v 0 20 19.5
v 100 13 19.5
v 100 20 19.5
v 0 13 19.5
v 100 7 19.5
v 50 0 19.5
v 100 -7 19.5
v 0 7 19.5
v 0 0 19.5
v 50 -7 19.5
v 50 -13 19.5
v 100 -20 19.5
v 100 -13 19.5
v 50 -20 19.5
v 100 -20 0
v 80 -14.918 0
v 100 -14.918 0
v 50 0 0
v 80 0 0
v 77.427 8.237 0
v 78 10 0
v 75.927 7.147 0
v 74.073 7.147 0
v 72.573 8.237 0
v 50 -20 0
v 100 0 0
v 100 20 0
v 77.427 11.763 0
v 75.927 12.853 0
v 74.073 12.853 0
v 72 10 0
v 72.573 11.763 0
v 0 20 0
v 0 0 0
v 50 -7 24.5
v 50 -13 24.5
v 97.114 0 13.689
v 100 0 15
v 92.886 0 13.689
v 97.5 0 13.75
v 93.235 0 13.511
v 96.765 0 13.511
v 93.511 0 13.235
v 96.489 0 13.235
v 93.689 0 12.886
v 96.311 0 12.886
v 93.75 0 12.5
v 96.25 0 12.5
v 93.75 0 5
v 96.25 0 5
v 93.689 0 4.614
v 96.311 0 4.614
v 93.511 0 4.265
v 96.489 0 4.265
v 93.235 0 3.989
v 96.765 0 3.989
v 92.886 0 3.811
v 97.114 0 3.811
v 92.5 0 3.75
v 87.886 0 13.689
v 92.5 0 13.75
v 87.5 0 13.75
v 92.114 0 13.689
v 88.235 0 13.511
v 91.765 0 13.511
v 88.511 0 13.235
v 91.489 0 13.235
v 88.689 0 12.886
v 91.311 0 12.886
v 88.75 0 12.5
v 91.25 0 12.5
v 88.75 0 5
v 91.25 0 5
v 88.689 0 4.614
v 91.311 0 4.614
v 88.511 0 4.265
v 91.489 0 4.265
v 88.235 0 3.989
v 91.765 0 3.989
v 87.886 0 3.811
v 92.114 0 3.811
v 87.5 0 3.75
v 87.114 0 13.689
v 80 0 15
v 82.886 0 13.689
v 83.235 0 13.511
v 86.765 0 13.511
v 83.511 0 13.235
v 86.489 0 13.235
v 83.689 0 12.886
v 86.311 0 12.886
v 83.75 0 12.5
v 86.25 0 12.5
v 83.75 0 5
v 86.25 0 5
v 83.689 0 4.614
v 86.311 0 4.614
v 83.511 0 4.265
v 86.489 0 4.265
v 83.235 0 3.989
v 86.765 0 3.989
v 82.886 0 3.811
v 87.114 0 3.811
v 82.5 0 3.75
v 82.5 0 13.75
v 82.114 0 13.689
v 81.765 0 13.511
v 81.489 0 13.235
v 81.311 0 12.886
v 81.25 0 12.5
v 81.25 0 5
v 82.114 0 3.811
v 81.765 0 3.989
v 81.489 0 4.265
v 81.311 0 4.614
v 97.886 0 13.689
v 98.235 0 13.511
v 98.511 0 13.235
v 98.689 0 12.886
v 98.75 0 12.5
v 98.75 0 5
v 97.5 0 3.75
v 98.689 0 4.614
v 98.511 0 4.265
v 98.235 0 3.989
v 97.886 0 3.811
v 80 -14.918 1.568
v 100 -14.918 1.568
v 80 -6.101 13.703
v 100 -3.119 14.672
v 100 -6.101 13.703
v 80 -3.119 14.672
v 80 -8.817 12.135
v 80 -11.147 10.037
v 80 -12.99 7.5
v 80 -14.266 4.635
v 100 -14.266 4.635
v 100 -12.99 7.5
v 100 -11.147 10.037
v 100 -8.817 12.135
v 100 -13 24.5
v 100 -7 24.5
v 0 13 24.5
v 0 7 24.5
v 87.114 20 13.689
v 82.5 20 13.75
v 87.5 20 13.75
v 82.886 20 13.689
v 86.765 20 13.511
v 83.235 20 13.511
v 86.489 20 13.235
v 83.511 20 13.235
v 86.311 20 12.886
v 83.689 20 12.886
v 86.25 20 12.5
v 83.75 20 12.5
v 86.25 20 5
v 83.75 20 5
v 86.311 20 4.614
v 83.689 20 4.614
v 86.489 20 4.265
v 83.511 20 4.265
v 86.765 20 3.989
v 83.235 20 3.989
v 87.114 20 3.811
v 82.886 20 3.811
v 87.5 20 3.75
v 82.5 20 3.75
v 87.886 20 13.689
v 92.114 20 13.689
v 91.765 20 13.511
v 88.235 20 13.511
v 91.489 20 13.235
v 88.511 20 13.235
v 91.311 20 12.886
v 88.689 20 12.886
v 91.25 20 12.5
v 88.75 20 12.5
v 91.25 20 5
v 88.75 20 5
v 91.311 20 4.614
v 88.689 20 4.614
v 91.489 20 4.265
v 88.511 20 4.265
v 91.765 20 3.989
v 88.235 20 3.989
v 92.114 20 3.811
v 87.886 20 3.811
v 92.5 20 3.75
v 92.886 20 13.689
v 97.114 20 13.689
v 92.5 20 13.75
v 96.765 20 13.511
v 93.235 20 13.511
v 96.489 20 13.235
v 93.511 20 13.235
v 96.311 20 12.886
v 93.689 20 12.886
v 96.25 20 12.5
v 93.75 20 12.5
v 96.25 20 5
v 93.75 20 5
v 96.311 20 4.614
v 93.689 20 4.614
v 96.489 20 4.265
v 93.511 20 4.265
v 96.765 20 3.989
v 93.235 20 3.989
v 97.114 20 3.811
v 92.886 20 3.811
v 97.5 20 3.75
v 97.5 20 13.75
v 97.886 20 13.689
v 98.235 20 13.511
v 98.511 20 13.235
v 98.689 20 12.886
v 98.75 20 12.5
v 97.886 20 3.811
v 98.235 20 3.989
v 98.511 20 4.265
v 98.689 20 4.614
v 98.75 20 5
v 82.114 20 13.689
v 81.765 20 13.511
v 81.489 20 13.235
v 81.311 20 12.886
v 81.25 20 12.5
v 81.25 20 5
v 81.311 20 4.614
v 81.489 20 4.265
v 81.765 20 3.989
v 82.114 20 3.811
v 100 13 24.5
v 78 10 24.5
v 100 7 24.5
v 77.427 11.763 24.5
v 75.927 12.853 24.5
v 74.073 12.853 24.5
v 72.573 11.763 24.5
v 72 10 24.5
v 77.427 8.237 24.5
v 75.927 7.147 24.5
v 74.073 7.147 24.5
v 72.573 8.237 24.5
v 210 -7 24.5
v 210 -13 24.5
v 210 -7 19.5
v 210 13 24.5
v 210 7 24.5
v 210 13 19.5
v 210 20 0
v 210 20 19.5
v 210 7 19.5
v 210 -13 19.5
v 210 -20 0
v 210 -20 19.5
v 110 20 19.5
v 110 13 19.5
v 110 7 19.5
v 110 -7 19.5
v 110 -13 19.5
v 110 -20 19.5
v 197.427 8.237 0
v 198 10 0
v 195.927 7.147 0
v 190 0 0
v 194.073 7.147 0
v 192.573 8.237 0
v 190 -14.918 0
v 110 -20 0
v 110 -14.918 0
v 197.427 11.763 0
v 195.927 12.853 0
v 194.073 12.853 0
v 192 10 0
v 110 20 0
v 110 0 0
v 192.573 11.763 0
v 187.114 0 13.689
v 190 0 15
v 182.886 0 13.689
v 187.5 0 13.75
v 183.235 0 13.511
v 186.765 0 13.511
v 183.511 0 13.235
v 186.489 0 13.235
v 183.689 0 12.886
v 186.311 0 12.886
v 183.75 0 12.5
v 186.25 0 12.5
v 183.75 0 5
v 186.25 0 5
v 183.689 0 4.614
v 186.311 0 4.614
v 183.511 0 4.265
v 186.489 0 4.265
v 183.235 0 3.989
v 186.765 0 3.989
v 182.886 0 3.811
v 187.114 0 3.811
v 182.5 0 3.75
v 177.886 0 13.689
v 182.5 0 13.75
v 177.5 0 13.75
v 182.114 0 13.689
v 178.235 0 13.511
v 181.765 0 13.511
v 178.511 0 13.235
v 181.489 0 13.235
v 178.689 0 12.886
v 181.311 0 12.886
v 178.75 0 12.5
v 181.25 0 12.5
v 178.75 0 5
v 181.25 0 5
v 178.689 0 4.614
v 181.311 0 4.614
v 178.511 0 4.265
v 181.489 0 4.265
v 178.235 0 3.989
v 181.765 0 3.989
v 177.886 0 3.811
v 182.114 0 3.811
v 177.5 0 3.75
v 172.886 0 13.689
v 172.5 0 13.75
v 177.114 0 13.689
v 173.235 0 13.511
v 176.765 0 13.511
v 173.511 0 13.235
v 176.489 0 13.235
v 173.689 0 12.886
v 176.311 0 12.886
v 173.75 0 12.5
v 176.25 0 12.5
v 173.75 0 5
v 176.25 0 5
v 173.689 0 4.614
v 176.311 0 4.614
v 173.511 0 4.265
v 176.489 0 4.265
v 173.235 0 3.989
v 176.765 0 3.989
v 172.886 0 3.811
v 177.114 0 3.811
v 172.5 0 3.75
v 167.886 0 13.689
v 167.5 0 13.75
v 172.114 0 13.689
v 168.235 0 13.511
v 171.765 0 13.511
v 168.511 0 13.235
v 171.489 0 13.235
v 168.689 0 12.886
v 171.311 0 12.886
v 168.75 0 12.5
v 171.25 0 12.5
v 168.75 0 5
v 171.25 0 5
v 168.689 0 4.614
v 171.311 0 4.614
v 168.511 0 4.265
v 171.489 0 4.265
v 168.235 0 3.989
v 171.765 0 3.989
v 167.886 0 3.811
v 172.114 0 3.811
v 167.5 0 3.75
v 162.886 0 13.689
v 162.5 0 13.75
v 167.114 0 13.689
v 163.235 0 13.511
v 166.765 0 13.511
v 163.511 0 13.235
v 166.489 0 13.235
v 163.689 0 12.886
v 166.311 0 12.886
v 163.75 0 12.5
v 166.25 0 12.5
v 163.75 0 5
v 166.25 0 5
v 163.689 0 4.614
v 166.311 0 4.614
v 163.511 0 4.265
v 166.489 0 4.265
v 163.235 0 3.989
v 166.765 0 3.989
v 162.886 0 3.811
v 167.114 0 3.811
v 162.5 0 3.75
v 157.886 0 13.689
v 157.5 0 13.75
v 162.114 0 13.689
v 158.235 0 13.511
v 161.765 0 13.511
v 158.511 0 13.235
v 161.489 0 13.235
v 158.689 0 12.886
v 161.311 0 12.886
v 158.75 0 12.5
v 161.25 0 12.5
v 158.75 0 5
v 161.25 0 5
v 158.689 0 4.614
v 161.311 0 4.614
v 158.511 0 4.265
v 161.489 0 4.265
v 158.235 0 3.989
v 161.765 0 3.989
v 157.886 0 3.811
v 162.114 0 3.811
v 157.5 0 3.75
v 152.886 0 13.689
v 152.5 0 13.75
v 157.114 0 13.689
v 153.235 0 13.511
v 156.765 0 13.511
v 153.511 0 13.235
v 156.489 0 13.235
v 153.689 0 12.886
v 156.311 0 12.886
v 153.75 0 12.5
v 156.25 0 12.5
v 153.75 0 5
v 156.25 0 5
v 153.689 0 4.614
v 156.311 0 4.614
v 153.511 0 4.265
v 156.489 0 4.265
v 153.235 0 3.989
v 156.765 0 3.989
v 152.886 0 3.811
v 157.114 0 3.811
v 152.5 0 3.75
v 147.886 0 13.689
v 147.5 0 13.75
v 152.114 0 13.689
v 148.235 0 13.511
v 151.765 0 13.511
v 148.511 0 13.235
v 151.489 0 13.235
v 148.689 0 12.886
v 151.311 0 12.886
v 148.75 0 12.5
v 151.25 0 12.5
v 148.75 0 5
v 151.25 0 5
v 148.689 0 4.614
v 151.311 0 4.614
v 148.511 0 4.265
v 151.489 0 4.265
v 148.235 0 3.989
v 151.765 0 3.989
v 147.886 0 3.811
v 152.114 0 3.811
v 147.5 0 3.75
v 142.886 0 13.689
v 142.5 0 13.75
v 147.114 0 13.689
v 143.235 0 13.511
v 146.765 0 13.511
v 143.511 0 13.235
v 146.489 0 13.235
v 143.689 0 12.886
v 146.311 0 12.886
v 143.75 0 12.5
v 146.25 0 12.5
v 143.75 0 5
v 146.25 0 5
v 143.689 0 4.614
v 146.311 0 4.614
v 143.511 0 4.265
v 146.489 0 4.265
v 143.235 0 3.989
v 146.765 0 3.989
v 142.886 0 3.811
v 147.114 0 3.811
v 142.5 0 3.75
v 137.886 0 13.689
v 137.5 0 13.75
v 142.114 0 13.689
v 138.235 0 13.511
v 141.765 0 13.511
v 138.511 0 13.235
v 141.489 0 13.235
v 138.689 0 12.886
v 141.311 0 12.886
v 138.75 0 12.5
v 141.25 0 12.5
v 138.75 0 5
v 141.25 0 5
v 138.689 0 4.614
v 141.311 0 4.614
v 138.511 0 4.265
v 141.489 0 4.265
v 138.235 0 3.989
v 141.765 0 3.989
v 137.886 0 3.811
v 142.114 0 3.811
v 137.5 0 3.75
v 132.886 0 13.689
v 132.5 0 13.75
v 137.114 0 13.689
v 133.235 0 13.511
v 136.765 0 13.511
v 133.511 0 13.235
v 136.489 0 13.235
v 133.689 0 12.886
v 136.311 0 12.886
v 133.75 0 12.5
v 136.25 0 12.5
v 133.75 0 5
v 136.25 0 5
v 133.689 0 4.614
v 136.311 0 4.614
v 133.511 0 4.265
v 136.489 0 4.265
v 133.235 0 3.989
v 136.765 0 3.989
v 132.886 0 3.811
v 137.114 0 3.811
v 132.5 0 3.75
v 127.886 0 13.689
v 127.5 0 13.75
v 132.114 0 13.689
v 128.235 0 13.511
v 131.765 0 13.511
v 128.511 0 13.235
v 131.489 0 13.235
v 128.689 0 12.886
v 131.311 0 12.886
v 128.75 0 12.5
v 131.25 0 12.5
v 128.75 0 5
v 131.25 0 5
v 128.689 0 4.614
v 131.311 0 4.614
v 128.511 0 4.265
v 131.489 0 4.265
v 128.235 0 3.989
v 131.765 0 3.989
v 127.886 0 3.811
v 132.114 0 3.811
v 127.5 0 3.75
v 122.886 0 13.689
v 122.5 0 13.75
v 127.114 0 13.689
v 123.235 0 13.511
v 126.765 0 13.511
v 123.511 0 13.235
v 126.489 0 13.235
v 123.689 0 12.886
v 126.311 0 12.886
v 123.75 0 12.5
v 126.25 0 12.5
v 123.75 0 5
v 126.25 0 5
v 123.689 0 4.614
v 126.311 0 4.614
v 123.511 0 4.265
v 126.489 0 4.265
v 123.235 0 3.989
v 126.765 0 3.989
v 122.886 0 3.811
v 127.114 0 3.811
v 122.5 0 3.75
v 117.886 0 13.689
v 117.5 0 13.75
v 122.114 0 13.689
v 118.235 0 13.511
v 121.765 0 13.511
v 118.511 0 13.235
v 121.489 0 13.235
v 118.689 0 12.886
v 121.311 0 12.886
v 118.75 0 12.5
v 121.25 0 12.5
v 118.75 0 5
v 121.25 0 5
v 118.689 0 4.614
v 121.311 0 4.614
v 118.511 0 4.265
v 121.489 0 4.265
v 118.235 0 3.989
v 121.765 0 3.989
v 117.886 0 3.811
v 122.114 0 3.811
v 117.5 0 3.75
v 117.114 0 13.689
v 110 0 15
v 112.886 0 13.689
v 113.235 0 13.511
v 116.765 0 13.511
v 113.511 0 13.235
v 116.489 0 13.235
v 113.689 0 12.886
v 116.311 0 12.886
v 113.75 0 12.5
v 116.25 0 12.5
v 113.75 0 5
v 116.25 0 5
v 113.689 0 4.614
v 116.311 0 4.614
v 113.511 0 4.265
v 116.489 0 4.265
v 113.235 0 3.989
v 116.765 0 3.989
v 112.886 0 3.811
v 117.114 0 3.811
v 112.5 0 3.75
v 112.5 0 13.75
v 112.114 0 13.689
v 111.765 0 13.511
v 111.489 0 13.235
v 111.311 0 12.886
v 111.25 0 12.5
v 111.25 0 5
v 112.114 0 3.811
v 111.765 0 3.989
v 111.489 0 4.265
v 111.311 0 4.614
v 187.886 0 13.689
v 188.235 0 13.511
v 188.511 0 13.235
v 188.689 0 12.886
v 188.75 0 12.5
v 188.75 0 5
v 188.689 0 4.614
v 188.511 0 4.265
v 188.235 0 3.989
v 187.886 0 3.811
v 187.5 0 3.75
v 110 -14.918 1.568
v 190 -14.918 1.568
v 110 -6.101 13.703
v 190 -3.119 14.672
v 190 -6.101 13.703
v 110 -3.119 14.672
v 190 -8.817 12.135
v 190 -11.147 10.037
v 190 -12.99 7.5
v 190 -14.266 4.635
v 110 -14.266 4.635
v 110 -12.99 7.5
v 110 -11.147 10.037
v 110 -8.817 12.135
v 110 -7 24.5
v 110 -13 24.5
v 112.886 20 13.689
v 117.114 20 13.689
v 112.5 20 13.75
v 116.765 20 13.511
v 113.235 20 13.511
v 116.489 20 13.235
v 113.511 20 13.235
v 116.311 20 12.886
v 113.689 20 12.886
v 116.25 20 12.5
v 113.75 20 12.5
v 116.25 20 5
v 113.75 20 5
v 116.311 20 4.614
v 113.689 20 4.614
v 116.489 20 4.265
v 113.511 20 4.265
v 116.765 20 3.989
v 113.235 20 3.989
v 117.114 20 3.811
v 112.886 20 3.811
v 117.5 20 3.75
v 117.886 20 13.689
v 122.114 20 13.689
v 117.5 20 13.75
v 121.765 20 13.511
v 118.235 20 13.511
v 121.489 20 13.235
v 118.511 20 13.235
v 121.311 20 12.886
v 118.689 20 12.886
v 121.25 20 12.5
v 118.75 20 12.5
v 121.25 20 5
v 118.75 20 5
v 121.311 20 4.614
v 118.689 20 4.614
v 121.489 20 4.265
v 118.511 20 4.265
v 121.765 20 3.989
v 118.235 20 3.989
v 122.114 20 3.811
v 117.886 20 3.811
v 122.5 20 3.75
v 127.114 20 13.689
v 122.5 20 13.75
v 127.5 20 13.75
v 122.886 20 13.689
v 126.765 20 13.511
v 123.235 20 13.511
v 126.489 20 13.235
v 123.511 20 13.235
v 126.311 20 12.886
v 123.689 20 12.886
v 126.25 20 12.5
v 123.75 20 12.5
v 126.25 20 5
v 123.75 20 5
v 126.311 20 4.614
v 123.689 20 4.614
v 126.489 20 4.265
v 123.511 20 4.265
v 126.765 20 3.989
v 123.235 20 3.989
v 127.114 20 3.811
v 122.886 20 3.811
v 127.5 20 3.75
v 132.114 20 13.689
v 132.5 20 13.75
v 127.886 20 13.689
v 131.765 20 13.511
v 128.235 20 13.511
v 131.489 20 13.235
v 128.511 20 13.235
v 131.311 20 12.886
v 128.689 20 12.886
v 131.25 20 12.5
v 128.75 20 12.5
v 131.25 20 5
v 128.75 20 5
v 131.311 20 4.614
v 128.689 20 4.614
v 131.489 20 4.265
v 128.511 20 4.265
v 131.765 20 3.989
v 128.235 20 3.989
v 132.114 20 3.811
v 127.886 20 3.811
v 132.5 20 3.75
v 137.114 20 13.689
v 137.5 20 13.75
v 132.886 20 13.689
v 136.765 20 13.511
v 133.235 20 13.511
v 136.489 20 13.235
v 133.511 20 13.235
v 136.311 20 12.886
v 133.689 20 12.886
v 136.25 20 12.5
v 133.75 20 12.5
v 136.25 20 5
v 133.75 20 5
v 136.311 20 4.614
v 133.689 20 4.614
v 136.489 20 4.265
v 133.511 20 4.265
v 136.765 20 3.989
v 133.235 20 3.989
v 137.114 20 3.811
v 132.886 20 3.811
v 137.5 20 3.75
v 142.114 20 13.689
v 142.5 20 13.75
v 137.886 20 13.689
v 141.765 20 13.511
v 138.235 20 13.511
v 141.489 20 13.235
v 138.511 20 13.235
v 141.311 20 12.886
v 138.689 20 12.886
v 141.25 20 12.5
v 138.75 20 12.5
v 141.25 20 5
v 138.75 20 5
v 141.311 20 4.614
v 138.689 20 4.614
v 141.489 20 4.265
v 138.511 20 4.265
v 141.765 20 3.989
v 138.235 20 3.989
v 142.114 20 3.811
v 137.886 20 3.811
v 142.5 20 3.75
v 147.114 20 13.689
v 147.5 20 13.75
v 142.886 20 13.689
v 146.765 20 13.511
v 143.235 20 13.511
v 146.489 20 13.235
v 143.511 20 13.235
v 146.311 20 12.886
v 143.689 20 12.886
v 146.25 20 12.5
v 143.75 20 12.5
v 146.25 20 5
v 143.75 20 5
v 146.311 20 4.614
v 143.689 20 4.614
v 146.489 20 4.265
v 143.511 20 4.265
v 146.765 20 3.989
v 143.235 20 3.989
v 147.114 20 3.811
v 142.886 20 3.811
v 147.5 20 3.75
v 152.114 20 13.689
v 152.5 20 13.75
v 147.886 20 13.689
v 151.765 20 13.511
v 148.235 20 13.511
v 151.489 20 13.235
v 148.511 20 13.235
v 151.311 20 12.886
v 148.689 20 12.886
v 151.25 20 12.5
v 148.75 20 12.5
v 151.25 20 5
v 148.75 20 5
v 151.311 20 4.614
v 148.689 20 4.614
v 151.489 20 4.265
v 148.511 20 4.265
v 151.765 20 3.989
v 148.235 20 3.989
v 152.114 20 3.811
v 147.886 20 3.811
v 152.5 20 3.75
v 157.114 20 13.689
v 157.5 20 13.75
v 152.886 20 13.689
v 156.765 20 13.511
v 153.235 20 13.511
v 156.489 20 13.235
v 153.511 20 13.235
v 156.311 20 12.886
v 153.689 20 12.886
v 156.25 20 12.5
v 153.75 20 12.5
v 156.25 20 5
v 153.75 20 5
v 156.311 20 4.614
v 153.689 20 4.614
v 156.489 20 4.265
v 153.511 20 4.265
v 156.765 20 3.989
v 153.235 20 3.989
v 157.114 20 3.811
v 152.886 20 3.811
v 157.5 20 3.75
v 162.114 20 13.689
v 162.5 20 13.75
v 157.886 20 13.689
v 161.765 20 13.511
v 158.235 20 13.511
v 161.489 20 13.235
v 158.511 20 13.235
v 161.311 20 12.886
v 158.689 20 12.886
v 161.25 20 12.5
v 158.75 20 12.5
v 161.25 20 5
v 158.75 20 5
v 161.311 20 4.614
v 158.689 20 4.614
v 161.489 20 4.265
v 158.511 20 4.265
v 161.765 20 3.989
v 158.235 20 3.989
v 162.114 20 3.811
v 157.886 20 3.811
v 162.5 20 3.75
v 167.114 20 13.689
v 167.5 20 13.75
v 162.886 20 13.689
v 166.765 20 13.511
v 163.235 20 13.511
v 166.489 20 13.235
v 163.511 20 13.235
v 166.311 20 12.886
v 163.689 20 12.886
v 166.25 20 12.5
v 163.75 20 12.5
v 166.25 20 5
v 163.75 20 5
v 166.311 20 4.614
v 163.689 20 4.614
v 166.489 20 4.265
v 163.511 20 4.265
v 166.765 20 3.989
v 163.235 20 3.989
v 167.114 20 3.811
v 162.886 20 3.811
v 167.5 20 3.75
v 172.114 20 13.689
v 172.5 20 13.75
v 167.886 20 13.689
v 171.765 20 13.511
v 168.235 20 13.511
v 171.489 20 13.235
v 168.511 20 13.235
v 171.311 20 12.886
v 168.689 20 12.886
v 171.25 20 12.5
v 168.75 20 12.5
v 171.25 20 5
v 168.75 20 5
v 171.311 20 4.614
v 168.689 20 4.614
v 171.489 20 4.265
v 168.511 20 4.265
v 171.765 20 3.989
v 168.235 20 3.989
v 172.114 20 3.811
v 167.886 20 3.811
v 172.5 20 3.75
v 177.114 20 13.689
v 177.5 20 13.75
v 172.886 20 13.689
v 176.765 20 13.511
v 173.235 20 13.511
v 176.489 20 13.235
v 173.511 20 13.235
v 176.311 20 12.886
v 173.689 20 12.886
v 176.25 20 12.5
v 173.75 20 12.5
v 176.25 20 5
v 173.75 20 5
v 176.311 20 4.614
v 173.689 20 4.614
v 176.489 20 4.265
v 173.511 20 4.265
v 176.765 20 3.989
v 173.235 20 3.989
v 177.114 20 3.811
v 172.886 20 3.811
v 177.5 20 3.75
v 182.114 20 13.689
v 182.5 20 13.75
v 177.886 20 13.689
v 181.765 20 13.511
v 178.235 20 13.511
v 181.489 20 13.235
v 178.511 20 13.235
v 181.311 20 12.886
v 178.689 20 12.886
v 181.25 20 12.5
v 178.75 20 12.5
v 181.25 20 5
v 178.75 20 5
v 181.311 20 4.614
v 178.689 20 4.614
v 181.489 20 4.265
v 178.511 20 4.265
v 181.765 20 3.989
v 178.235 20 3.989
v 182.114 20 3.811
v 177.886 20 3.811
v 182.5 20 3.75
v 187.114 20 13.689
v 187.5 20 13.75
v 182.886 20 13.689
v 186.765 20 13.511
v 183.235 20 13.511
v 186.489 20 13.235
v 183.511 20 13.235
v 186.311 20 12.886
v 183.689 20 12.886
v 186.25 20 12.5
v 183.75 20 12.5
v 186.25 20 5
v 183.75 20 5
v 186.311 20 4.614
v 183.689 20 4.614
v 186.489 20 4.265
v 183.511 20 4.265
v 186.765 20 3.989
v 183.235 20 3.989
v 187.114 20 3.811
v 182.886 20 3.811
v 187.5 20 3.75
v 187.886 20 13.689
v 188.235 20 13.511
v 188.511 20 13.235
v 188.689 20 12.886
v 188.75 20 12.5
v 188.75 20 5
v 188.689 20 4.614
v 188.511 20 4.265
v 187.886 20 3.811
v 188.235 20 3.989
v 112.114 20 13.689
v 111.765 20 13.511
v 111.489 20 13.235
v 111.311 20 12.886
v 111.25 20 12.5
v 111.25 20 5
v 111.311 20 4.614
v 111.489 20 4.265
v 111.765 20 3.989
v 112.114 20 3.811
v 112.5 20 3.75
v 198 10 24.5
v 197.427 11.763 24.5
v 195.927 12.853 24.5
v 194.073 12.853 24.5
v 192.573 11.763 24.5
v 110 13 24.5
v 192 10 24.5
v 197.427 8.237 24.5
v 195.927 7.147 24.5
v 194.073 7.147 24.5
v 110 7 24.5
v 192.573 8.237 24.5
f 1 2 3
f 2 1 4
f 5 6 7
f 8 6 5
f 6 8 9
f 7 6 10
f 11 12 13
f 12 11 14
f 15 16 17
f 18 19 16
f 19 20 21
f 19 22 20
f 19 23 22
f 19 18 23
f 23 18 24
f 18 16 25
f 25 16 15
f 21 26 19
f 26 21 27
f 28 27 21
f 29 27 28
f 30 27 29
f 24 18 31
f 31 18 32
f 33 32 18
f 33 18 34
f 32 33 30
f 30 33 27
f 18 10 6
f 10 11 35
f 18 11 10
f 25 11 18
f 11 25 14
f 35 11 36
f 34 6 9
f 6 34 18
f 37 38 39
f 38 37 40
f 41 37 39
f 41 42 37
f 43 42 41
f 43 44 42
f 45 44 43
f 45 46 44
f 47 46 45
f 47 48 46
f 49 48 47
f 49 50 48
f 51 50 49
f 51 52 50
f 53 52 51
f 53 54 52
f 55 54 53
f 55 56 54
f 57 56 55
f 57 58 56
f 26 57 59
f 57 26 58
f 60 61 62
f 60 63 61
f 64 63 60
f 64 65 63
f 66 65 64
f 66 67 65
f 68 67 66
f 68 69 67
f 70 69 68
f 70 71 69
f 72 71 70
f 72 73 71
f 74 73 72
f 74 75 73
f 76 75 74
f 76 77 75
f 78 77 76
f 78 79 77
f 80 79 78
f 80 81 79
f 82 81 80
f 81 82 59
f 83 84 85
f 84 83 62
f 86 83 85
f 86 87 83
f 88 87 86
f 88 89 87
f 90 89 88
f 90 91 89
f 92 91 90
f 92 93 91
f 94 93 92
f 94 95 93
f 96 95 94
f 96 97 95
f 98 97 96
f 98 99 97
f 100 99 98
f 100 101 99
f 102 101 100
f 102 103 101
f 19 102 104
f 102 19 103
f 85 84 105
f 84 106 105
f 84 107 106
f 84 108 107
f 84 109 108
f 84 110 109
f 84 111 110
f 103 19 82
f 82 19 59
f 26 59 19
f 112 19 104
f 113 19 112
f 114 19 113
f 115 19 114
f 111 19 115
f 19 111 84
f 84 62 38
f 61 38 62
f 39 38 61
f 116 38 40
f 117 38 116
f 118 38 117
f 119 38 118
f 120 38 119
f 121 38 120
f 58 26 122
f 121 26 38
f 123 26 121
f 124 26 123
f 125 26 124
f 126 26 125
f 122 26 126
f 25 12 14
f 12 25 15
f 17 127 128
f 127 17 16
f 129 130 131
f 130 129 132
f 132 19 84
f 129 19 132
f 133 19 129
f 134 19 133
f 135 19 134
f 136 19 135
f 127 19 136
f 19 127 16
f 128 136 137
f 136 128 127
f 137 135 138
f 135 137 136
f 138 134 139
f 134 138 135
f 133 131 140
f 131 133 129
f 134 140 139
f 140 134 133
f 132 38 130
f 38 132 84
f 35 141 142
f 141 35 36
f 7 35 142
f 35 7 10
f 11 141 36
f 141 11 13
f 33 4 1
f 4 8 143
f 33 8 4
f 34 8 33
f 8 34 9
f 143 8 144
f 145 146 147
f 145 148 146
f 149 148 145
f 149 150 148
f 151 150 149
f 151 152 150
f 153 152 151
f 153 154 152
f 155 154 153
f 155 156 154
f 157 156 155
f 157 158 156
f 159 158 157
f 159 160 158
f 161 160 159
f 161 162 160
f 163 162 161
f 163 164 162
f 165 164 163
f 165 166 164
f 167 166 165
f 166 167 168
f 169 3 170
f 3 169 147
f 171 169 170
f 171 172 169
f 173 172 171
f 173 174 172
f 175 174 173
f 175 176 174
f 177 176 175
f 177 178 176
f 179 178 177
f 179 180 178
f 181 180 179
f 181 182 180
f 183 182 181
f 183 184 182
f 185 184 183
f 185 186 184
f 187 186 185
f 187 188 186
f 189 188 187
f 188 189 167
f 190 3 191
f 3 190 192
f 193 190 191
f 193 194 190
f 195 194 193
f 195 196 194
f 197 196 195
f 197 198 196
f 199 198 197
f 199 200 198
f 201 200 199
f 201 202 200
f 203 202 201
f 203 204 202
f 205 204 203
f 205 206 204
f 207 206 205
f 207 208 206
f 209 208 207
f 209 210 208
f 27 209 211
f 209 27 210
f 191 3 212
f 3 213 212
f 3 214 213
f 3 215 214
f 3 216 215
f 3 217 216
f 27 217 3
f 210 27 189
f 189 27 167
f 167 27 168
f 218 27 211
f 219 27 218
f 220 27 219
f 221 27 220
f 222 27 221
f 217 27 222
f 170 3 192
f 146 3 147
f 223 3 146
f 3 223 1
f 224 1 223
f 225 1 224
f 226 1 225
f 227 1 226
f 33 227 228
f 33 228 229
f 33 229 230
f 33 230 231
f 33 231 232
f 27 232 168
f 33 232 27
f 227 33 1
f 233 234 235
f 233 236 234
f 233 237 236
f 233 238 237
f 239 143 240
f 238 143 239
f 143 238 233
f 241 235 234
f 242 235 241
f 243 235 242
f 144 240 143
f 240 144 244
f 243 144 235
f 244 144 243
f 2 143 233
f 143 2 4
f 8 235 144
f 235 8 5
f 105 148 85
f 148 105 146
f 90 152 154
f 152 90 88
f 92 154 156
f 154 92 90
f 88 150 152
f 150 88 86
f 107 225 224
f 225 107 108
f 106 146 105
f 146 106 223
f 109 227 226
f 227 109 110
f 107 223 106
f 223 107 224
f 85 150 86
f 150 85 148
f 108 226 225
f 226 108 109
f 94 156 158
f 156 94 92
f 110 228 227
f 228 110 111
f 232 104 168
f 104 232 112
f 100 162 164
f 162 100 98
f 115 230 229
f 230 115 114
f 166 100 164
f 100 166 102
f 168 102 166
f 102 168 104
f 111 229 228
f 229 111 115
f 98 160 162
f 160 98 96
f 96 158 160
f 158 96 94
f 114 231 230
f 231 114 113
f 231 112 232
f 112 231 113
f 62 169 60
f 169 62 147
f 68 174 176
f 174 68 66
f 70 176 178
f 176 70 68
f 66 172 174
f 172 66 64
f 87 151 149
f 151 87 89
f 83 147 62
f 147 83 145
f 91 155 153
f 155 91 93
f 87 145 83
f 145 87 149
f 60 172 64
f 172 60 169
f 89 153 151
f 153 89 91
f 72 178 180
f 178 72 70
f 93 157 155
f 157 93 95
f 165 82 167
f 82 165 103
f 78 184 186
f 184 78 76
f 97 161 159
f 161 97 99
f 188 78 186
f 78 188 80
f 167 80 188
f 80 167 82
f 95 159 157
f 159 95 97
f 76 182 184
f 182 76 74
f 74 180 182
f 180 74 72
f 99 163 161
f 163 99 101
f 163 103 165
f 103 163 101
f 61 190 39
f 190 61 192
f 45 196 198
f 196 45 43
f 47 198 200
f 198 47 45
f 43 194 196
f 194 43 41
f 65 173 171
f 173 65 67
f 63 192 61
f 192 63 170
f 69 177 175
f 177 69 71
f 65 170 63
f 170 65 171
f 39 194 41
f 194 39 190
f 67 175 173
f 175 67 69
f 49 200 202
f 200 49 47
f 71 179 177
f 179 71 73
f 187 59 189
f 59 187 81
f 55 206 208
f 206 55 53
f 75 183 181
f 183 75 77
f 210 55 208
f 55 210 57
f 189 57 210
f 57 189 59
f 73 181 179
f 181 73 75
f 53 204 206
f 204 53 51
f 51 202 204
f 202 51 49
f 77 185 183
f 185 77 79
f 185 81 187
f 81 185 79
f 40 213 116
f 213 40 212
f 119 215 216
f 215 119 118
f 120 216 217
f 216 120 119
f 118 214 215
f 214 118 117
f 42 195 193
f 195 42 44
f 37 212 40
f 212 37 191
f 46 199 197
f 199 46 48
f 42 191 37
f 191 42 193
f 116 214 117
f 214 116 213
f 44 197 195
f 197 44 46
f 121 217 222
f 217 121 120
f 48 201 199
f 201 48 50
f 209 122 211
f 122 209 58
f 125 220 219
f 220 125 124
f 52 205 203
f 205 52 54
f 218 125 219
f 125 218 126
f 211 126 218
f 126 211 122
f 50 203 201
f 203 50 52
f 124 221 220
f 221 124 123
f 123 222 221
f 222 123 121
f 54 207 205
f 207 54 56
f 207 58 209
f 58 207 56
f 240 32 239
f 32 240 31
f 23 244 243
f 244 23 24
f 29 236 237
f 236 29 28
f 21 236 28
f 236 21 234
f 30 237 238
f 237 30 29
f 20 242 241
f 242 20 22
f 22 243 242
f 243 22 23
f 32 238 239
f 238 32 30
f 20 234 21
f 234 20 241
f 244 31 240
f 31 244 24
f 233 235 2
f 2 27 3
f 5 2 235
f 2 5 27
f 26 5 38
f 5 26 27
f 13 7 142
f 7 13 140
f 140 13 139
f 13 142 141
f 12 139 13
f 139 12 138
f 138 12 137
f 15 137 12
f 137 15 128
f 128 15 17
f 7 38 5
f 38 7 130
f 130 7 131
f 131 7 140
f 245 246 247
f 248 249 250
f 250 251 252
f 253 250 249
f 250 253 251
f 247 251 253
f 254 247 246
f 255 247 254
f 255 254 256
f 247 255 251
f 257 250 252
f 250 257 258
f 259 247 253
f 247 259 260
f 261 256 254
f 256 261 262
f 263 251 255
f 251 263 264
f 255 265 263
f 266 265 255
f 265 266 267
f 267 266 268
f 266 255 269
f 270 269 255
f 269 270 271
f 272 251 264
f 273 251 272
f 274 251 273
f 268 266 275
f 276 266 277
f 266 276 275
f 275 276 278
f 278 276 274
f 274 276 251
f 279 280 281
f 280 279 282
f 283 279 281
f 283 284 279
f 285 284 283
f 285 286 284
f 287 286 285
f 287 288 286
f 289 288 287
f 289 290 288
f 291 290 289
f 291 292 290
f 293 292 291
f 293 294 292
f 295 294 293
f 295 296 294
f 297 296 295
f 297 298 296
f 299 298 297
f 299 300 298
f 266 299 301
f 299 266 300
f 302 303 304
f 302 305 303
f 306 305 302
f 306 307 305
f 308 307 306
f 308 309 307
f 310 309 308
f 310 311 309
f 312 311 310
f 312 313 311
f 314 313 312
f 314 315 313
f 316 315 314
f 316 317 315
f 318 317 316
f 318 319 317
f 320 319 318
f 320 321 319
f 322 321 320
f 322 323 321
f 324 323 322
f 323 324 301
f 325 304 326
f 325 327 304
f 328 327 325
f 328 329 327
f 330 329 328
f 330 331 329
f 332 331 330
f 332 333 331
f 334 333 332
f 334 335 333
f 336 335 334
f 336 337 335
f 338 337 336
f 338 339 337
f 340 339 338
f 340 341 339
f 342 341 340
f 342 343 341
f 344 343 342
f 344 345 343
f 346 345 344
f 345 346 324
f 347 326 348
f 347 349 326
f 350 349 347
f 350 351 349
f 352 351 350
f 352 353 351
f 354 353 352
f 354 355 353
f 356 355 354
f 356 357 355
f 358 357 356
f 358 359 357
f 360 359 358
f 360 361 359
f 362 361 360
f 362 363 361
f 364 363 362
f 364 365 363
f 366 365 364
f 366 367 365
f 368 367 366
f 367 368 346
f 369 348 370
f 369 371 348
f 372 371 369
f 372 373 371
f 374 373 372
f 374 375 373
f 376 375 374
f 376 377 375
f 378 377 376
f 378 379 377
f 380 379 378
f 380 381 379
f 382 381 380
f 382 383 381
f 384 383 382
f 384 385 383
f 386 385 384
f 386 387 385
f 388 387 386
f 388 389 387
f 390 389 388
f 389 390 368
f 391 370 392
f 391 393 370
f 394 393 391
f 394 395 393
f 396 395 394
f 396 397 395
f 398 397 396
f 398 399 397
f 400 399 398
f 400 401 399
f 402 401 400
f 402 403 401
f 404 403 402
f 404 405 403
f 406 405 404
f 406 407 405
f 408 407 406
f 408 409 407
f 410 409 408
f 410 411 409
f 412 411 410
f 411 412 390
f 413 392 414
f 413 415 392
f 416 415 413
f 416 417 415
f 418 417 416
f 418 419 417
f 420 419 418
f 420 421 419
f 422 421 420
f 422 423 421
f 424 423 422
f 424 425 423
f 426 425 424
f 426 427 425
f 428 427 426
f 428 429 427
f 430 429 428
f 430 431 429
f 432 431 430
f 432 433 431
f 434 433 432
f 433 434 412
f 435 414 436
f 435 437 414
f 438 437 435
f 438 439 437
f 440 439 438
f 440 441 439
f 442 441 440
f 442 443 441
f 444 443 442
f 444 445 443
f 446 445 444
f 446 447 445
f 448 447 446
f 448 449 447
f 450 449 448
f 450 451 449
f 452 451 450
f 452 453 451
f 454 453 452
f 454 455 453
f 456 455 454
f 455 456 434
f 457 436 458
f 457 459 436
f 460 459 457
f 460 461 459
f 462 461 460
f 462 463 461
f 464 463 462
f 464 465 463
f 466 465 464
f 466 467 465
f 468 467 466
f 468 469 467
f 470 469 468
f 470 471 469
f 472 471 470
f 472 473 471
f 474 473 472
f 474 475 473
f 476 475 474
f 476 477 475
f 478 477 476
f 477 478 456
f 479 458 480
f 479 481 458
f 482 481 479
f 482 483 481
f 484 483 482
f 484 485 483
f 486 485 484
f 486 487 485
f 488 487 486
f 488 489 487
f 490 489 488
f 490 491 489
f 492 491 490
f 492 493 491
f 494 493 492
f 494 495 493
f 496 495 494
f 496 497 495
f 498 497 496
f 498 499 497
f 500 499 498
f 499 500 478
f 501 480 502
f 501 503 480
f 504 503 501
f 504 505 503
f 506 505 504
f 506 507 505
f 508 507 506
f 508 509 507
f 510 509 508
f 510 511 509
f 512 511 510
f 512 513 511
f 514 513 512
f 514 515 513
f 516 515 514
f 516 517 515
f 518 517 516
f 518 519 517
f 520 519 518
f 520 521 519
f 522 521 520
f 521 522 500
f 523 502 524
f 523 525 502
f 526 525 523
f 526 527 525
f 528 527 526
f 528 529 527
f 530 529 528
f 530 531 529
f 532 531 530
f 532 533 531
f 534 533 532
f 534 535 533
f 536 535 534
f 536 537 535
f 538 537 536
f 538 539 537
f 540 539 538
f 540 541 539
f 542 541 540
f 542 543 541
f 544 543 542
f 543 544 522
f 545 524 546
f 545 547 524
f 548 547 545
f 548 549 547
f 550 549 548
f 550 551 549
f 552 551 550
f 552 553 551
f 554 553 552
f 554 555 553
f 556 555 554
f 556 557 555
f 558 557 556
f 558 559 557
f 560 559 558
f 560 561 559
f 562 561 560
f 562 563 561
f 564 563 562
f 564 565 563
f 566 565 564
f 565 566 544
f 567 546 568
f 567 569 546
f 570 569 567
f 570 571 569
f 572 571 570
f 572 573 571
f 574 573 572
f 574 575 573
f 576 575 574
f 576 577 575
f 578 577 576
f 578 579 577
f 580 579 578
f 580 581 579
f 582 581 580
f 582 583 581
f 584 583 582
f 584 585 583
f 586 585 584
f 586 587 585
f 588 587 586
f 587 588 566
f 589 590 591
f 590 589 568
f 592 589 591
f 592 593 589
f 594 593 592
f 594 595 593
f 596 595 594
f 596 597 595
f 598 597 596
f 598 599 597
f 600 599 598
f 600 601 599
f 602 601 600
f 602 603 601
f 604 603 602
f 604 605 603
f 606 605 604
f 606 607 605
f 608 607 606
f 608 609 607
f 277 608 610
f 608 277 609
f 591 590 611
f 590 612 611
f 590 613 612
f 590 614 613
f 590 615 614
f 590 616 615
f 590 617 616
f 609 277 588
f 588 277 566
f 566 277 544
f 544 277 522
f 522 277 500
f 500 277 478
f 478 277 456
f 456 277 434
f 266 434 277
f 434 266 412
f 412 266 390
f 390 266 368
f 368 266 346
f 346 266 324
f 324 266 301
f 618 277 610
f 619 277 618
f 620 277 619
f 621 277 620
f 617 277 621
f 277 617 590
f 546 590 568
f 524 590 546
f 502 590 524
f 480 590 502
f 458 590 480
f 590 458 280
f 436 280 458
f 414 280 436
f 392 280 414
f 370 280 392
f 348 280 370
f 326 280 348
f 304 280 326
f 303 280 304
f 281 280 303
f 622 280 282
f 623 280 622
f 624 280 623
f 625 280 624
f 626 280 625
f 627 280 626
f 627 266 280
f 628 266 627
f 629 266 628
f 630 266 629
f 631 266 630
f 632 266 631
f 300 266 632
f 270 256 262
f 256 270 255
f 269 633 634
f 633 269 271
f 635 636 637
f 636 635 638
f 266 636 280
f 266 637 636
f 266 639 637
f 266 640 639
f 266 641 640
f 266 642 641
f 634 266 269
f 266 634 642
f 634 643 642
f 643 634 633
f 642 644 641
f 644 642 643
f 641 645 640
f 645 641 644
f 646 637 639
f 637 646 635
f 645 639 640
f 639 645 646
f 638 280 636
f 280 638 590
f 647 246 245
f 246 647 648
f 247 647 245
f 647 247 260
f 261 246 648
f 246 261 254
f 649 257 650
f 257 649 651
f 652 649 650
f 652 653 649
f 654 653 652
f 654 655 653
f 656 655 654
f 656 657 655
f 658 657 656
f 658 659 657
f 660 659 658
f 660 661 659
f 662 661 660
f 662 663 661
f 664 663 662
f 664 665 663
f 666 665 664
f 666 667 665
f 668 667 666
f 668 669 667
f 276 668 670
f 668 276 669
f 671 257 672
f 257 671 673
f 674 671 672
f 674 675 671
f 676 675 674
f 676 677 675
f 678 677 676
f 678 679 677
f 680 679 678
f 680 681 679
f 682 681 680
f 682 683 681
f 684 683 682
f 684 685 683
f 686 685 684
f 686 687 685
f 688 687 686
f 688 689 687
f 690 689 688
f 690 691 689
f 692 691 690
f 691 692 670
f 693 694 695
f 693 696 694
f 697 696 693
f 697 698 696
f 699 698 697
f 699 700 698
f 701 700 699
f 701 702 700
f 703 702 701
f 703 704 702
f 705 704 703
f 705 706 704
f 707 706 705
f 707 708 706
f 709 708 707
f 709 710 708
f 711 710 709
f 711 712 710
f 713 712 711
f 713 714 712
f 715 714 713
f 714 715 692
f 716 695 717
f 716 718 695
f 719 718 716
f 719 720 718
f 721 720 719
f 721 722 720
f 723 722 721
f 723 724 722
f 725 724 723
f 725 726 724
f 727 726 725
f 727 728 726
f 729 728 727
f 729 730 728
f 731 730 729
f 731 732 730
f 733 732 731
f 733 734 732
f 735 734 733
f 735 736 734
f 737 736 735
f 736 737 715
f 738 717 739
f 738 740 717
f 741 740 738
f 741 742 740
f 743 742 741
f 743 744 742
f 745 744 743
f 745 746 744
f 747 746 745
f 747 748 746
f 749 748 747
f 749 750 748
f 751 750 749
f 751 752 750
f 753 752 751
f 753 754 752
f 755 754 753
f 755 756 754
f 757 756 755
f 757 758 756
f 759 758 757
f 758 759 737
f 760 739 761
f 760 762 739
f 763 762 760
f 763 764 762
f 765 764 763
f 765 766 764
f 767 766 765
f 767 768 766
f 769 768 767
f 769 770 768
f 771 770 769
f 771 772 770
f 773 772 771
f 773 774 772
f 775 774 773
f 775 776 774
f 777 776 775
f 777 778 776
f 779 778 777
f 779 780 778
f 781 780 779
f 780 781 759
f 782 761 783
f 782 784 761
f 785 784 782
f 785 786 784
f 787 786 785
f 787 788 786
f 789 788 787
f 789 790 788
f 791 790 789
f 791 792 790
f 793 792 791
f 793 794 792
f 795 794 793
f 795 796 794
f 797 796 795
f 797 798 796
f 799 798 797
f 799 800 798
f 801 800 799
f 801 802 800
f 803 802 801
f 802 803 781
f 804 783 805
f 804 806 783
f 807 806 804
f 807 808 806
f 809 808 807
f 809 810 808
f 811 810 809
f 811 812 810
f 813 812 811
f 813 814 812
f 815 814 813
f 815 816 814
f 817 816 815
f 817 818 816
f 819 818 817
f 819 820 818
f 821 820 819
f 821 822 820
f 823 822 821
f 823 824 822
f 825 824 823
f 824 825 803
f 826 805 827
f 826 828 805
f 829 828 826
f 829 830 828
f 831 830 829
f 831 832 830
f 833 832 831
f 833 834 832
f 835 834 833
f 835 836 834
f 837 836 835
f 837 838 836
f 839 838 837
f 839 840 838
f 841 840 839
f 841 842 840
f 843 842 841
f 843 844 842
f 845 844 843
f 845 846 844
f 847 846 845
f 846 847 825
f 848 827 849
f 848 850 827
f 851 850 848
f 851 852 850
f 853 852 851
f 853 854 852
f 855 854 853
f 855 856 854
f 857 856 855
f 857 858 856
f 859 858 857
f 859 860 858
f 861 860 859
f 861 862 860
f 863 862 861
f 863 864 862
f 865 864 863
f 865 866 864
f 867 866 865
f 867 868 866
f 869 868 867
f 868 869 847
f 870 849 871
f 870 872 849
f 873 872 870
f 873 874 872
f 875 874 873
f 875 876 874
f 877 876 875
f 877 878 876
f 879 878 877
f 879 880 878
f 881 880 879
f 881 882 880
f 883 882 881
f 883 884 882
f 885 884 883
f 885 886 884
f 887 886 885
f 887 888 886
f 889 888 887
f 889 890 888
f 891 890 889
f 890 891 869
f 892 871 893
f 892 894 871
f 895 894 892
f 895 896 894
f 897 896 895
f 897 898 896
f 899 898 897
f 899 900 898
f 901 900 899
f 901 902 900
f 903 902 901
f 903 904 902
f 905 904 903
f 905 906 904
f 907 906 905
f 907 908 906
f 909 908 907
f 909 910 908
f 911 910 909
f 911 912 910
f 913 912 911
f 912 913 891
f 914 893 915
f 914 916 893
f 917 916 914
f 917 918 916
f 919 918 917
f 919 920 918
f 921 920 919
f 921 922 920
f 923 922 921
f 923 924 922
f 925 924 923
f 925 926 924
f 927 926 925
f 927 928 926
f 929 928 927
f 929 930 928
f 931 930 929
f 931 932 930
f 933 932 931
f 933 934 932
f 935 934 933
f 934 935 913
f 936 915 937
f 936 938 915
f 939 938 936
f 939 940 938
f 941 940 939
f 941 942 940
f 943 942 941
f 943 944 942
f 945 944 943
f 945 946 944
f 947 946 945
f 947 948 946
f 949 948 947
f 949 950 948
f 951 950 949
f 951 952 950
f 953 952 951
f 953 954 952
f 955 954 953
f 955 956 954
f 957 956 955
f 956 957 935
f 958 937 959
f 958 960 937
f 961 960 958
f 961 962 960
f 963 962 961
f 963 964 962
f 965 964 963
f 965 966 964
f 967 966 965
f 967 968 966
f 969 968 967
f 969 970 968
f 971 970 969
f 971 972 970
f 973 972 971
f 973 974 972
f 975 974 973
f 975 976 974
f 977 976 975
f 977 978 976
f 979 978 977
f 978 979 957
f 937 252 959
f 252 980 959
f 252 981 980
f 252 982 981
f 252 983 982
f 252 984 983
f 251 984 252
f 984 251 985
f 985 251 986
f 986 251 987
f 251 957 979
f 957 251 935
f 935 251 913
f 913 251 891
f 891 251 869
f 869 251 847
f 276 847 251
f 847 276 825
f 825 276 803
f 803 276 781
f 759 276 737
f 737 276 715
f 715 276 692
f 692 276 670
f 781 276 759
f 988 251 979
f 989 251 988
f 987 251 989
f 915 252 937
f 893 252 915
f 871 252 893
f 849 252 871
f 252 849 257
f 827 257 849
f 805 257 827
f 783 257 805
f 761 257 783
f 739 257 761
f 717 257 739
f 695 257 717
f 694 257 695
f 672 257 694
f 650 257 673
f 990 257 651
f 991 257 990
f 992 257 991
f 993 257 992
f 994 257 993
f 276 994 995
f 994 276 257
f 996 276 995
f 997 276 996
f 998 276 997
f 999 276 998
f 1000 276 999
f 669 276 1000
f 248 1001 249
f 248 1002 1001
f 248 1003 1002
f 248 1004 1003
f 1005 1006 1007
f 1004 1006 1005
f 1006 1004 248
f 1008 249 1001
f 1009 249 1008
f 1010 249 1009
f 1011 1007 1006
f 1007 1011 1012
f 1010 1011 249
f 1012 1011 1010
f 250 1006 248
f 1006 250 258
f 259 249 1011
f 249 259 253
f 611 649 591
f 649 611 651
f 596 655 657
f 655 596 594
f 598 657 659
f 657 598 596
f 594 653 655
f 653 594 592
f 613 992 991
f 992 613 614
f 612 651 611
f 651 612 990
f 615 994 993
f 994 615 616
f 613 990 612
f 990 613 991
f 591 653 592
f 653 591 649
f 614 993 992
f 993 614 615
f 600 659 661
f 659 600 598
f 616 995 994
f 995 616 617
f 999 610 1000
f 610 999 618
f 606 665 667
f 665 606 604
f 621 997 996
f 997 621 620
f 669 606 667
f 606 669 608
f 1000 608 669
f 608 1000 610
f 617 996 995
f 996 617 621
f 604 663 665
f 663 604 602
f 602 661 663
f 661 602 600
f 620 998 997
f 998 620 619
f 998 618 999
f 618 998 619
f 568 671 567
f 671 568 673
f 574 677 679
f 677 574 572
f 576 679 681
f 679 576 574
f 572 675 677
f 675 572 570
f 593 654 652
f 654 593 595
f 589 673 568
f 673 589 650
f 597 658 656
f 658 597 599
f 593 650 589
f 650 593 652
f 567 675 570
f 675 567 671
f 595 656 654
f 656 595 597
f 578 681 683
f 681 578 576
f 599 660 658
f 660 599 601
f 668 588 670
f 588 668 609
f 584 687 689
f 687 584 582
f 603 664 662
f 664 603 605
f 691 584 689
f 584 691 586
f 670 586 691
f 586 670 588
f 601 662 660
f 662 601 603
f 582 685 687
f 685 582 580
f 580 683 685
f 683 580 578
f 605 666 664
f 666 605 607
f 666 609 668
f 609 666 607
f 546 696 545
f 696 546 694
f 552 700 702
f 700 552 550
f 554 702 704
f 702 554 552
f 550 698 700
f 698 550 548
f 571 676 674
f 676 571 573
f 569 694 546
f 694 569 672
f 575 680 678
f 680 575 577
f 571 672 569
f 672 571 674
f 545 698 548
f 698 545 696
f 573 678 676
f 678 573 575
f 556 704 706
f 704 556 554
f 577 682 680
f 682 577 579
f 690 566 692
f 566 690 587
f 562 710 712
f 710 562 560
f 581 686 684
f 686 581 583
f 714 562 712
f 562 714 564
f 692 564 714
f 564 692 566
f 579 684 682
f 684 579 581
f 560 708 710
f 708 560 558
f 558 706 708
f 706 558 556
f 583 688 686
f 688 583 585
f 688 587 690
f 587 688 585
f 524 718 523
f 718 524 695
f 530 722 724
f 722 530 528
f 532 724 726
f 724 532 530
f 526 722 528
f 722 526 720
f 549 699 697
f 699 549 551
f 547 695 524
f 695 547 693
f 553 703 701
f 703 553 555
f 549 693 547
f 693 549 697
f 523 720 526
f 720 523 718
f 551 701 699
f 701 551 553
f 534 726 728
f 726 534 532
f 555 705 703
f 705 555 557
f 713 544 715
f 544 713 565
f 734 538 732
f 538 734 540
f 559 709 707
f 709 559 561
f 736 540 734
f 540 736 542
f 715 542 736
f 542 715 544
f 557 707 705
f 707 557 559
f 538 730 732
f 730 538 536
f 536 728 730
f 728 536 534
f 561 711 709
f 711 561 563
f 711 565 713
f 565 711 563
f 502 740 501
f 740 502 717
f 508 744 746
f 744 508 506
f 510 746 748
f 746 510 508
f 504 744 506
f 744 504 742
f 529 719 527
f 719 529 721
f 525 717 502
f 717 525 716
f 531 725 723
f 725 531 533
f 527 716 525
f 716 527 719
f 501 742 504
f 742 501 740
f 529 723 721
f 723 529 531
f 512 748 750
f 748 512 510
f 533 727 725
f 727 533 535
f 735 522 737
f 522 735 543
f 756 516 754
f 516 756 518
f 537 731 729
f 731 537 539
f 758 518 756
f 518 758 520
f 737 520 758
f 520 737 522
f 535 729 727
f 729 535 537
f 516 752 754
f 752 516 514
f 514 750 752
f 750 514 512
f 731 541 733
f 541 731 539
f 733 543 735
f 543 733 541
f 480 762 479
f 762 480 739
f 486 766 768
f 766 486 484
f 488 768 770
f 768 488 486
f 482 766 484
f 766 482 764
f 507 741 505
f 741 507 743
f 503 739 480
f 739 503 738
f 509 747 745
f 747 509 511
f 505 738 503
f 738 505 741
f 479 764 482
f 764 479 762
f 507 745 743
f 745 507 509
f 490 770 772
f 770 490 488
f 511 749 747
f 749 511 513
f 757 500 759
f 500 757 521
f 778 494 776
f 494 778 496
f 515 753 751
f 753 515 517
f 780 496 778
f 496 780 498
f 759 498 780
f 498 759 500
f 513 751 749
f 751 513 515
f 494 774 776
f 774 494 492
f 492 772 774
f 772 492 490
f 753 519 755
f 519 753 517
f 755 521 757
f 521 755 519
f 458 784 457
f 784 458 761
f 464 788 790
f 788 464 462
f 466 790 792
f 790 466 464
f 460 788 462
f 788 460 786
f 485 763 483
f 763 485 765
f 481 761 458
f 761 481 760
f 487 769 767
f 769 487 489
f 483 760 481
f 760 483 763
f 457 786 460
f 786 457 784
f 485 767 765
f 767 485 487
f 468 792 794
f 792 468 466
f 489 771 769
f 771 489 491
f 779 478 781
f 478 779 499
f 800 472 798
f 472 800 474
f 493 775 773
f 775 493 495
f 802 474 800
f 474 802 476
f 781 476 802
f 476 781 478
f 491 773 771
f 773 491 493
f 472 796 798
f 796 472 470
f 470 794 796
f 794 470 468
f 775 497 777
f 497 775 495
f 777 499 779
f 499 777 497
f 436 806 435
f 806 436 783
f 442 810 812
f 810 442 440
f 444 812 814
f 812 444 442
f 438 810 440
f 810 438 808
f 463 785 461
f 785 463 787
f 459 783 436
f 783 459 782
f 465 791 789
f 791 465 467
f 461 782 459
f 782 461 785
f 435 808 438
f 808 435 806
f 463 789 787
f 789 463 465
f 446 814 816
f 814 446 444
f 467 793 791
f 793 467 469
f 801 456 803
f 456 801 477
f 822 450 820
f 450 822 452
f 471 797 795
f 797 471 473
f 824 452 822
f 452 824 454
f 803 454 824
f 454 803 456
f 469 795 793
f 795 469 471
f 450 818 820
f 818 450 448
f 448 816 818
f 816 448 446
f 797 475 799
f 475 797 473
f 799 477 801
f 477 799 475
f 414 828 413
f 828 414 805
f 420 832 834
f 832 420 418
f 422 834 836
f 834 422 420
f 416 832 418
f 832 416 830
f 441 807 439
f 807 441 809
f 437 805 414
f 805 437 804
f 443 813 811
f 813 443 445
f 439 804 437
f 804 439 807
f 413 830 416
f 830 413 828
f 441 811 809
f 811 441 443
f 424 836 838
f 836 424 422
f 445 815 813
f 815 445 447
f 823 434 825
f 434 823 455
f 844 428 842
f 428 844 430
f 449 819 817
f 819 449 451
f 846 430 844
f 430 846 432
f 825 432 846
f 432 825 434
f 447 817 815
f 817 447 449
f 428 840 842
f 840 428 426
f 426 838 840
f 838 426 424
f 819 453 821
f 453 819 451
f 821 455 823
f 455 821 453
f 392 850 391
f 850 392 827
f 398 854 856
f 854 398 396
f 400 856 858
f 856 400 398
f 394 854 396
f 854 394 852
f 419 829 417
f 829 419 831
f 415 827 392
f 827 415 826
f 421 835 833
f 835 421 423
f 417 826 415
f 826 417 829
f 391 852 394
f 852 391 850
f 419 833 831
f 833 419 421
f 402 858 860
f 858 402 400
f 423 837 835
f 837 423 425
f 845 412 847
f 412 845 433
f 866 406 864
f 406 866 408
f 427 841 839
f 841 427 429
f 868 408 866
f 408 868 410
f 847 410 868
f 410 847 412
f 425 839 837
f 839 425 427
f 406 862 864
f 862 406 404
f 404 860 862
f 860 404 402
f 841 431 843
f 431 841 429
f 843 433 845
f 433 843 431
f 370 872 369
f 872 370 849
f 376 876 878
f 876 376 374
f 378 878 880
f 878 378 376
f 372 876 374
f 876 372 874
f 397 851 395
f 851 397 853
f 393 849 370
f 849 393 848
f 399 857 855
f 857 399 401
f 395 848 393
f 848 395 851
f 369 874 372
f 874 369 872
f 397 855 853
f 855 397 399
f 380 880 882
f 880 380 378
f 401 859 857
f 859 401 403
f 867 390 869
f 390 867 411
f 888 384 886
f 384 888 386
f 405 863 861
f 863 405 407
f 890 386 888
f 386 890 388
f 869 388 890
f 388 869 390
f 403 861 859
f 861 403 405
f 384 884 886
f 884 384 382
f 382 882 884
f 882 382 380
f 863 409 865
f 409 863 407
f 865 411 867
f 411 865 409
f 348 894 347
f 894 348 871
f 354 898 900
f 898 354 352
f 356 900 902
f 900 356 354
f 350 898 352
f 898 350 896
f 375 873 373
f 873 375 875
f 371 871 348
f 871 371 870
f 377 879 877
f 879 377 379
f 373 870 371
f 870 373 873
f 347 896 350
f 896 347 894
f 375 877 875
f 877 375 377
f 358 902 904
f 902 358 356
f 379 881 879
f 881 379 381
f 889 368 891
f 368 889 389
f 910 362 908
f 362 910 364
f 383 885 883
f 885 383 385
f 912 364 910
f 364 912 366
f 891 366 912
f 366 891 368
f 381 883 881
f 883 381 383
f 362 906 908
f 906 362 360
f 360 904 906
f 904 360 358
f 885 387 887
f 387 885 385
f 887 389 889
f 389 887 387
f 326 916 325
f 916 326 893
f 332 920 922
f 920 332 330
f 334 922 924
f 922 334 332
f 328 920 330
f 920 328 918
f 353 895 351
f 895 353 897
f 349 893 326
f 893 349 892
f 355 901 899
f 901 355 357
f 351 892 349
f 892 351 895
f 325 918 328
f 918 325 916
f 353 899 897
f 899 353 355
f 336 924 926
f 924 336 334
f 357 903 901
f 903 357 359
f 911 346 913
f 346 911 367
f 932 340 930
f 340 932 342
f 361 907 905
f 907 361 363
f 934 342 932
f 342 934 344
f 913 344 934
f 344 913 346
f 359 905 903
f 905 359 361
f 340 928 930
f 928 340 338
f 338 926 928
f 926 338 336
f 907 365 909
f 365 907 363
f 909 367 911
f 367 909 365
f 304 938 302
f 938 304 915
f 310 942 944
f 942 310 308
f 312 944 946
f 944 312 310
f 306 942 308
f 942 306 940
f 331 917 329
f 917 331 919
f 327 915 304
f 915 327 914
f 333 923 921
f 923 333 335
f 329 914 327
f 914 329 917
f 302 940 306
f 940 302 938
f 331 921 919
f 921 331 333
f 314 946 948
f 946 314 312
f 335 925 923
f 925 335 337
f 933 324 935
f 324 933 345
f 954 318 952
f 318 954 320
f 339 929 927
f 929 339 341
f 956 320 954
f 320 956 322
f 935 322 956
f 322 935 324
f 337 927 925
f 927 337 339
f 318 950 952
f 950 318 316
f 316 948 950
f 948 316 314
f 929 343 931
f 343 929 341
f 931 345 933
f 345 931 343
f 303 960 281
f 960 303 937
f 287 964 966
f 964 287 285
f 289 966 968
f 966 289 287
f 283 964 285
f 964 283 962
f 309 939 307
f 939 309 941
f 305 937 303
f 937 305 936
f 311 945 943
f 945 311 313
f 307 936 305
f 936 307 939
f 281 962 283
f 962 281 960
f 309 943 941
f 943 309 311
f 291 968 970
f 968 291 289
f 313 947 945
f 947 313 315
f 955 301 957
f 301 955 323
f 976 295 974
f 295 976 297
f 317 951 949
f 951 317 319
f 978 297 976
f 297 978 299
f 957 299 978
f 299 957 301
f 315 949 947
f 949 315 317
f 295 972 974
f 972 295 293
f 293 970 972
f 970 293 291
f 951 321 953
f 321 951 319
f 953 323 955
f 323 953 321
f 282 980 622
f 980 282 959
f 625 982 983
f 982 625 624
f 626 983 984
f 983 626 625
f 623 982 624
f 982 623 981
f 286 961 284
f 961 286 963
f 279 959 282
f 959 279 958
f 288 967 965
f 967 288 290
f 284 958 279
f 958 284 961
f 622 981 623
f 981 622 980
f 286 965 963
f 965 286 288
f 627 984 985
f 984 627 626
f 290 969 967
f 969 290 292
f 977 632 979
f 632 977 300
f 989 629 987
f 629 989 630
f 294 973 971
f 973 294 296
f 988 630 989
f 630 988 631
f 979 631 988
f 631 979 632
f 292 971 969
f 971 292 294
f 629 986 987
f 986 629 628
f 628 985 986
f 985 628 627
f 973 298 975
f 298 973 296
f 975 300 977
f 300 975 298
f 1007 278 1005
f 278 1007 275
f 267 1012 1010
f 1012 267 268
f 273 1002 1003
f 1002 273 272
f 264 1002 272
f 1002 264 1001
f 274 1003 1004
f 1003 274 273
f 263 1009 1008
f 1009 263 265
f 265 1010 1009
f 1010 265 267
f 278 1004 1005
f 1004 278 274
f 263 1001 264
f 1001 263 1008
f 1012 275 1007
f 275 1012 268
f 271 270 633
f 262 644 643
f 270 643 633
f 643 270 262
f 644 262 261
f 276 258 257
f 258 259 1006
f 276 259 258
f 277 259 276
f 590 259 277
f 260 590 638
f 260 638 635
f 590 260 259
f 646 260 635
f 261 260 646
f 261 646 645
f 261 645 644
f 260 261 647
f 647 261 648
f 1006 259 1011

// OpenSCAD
module airvent() {
    translate([0,40,5]){
        rotate(a=[90,0,0]){
            translate([0,7.5,20]){
                cylinder(r=1.25, h=20,$fn=20);
            }
            translate([-1.25,0,20]){
                cube([2.5,7.5,20]);
            }
            
            translate([0,0,20]){
                cylinder(r=1.25, h=20,$fn=20);
            }
        }
    }
}

module bracket() {
difference() {
    union() {
        // long rim
        cube([200, 20, 19.5]);
        translate([0,7,19.5]){
            cube([200, 6, 5]);
        }
        
        // short rim
        translate([50,-20,0]){ 
            difference(){
                cube([150, 20, 19.5]);
                translate([30,20,0]){
                rotate(a=[0,90,0]){
                    cylinder(h = 100, r=15);
                }
            }
            }
            translate([0,7,19.5]){
                cube([150, 6, 5]);
            }
        }
     }
     
    // hole 1
    translate([75,10,12.5]){
          cylinder(h = 25, r = 3, center = true);
     }
 
     // hole 2
     translate([185,10,12.5]){
        cylinder(h = 25, r = 3, center = true);
       }
    
      for ( i = [0 : 19] ){
          translate([82.5 + i*5,0,0]){ airvent(); }
      }
  }
}
 

module partA(){
difference(){
     bracket();
      translate([100,-20,0]){
        cube([100,40,25]);
     }
 }
 }

module partB() {
 translate([10,0,0]){
 intersection(){
     bracket();
      translate([100,-20,0]){
        cube([100,40,25]);
     }
 }
 }
 }
 
partA();
partB();
